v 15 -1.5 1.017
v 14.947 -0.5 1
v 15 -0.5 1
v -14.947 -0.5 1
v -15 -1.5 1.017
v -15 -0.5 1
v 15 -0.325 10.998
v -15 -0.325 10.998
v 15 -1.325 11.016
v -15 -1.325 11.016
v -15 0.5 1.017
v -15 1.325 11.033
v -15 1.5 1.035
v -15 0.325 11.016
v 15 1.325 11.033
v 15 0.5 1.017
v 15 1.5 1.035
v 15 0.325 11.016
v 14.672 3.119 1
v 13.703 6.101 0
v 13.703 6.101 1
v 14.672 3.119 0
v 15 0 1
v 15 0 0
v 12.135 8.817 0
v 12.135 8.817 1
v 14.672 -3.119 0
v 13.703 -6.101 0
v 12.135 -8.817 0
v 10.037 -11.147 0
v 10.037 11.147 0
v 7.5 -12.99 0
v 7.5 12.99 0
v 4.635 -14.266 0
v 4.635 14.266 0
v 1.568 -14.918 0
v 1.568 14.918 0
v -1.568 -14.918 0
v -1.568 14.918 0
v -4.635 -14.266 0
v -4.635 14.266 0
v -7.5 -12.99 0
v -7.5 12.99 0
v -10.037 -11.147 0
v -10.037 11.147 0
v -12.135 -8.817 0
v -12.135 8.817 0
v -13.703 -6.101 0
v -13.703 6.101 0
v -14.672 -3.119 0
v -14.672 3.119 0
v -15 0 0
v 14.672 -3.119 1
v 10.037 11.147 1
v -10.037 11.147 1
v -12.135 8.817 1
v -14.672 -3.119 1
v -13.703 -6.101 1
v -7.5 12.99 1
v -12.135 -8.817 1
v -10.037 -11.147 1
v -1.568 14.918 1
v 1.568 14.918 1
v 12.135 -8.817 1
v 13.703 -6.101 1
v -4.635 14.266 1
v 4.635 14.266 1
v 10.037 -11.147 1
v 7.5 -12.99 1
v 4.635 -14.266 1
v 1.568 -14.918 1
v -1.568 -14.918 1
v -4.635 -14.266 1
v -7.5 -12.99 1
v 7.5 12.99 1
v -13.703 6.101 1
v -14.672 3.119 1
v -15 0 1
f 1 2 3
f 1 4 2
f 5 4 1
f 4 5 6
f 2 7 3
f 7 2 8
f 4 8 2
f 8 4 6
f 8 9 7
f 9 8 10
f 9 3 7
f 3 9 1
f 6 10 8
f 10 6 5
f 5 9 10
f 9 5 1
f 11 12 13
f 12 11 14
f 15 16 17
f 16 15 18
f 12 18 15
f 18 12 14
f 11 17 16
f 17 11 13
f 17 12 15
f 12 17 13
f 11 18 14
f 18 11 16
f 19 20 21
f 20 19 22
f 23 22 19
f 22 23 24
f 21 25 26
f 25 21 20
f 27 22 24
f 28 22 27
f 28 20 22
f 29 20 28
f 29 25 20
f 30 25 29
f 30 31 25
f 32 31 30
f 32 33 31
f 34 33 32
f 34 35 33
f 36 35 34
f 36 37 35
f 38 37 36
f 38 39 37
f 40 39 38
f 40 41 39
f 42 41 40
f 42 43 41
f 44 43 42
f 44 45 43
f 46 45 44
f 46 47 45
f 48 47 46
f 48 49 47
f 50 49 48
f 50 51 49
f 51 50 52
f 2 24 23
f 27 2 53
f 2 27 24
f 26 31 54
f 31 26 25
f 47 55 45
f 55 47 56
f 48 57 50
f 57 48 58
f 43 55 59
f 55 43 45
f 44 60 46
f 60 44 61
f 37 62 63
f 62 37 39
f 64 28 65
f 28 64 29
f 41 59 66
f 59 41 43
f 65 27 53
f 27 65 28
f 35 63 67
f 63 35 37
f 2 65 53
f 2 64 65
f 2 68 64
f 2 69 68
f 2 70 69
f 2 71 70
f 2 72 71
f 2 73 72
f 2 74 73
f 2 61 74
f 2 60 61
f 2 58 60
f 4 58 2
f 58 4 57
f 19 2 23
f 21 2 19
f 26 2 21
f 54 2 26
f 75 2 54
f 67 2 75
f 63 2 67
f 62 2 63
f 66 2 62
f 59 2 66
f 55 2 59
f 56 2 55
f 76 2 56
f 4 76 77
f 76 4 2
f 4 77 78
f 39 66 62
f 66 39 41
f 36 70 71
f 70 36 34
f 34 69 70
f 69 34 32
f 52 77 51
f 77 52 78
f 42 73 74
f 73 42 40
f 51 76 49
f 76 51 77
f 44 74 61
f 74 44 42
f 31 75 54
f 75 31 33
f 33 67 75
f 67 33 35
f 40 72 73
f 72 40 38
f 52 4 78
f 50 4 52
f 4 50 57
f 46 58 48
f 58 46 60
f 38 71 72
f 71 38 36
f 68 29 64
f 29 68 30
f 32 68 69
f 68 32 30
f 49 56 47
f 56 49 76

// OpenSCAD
// Base
base_diameter = 30;
base_height = 1;

cylinder(h=base_height, r=(base_diameter/2));

// Tabs
tab_height = 10;
tab_thickness = 1;
tab_space = 1;
tab_angle = 1;

translate([-(base_diameter/2), -(tab_thickness/2), base_height]){
    rotate([-tab_angle, 0, 0]) {
        translate([0, -(tab_space), 0]) {
            cube([base_diameter, tab_thickness, tab_height]);
        }
    }
    rotate([tab_angle, 0, 0]) {
        translate([0, tab_space, 0]) {
            cube([base_diameter, tab_thickness, tab_height]);
        }
    }
}
